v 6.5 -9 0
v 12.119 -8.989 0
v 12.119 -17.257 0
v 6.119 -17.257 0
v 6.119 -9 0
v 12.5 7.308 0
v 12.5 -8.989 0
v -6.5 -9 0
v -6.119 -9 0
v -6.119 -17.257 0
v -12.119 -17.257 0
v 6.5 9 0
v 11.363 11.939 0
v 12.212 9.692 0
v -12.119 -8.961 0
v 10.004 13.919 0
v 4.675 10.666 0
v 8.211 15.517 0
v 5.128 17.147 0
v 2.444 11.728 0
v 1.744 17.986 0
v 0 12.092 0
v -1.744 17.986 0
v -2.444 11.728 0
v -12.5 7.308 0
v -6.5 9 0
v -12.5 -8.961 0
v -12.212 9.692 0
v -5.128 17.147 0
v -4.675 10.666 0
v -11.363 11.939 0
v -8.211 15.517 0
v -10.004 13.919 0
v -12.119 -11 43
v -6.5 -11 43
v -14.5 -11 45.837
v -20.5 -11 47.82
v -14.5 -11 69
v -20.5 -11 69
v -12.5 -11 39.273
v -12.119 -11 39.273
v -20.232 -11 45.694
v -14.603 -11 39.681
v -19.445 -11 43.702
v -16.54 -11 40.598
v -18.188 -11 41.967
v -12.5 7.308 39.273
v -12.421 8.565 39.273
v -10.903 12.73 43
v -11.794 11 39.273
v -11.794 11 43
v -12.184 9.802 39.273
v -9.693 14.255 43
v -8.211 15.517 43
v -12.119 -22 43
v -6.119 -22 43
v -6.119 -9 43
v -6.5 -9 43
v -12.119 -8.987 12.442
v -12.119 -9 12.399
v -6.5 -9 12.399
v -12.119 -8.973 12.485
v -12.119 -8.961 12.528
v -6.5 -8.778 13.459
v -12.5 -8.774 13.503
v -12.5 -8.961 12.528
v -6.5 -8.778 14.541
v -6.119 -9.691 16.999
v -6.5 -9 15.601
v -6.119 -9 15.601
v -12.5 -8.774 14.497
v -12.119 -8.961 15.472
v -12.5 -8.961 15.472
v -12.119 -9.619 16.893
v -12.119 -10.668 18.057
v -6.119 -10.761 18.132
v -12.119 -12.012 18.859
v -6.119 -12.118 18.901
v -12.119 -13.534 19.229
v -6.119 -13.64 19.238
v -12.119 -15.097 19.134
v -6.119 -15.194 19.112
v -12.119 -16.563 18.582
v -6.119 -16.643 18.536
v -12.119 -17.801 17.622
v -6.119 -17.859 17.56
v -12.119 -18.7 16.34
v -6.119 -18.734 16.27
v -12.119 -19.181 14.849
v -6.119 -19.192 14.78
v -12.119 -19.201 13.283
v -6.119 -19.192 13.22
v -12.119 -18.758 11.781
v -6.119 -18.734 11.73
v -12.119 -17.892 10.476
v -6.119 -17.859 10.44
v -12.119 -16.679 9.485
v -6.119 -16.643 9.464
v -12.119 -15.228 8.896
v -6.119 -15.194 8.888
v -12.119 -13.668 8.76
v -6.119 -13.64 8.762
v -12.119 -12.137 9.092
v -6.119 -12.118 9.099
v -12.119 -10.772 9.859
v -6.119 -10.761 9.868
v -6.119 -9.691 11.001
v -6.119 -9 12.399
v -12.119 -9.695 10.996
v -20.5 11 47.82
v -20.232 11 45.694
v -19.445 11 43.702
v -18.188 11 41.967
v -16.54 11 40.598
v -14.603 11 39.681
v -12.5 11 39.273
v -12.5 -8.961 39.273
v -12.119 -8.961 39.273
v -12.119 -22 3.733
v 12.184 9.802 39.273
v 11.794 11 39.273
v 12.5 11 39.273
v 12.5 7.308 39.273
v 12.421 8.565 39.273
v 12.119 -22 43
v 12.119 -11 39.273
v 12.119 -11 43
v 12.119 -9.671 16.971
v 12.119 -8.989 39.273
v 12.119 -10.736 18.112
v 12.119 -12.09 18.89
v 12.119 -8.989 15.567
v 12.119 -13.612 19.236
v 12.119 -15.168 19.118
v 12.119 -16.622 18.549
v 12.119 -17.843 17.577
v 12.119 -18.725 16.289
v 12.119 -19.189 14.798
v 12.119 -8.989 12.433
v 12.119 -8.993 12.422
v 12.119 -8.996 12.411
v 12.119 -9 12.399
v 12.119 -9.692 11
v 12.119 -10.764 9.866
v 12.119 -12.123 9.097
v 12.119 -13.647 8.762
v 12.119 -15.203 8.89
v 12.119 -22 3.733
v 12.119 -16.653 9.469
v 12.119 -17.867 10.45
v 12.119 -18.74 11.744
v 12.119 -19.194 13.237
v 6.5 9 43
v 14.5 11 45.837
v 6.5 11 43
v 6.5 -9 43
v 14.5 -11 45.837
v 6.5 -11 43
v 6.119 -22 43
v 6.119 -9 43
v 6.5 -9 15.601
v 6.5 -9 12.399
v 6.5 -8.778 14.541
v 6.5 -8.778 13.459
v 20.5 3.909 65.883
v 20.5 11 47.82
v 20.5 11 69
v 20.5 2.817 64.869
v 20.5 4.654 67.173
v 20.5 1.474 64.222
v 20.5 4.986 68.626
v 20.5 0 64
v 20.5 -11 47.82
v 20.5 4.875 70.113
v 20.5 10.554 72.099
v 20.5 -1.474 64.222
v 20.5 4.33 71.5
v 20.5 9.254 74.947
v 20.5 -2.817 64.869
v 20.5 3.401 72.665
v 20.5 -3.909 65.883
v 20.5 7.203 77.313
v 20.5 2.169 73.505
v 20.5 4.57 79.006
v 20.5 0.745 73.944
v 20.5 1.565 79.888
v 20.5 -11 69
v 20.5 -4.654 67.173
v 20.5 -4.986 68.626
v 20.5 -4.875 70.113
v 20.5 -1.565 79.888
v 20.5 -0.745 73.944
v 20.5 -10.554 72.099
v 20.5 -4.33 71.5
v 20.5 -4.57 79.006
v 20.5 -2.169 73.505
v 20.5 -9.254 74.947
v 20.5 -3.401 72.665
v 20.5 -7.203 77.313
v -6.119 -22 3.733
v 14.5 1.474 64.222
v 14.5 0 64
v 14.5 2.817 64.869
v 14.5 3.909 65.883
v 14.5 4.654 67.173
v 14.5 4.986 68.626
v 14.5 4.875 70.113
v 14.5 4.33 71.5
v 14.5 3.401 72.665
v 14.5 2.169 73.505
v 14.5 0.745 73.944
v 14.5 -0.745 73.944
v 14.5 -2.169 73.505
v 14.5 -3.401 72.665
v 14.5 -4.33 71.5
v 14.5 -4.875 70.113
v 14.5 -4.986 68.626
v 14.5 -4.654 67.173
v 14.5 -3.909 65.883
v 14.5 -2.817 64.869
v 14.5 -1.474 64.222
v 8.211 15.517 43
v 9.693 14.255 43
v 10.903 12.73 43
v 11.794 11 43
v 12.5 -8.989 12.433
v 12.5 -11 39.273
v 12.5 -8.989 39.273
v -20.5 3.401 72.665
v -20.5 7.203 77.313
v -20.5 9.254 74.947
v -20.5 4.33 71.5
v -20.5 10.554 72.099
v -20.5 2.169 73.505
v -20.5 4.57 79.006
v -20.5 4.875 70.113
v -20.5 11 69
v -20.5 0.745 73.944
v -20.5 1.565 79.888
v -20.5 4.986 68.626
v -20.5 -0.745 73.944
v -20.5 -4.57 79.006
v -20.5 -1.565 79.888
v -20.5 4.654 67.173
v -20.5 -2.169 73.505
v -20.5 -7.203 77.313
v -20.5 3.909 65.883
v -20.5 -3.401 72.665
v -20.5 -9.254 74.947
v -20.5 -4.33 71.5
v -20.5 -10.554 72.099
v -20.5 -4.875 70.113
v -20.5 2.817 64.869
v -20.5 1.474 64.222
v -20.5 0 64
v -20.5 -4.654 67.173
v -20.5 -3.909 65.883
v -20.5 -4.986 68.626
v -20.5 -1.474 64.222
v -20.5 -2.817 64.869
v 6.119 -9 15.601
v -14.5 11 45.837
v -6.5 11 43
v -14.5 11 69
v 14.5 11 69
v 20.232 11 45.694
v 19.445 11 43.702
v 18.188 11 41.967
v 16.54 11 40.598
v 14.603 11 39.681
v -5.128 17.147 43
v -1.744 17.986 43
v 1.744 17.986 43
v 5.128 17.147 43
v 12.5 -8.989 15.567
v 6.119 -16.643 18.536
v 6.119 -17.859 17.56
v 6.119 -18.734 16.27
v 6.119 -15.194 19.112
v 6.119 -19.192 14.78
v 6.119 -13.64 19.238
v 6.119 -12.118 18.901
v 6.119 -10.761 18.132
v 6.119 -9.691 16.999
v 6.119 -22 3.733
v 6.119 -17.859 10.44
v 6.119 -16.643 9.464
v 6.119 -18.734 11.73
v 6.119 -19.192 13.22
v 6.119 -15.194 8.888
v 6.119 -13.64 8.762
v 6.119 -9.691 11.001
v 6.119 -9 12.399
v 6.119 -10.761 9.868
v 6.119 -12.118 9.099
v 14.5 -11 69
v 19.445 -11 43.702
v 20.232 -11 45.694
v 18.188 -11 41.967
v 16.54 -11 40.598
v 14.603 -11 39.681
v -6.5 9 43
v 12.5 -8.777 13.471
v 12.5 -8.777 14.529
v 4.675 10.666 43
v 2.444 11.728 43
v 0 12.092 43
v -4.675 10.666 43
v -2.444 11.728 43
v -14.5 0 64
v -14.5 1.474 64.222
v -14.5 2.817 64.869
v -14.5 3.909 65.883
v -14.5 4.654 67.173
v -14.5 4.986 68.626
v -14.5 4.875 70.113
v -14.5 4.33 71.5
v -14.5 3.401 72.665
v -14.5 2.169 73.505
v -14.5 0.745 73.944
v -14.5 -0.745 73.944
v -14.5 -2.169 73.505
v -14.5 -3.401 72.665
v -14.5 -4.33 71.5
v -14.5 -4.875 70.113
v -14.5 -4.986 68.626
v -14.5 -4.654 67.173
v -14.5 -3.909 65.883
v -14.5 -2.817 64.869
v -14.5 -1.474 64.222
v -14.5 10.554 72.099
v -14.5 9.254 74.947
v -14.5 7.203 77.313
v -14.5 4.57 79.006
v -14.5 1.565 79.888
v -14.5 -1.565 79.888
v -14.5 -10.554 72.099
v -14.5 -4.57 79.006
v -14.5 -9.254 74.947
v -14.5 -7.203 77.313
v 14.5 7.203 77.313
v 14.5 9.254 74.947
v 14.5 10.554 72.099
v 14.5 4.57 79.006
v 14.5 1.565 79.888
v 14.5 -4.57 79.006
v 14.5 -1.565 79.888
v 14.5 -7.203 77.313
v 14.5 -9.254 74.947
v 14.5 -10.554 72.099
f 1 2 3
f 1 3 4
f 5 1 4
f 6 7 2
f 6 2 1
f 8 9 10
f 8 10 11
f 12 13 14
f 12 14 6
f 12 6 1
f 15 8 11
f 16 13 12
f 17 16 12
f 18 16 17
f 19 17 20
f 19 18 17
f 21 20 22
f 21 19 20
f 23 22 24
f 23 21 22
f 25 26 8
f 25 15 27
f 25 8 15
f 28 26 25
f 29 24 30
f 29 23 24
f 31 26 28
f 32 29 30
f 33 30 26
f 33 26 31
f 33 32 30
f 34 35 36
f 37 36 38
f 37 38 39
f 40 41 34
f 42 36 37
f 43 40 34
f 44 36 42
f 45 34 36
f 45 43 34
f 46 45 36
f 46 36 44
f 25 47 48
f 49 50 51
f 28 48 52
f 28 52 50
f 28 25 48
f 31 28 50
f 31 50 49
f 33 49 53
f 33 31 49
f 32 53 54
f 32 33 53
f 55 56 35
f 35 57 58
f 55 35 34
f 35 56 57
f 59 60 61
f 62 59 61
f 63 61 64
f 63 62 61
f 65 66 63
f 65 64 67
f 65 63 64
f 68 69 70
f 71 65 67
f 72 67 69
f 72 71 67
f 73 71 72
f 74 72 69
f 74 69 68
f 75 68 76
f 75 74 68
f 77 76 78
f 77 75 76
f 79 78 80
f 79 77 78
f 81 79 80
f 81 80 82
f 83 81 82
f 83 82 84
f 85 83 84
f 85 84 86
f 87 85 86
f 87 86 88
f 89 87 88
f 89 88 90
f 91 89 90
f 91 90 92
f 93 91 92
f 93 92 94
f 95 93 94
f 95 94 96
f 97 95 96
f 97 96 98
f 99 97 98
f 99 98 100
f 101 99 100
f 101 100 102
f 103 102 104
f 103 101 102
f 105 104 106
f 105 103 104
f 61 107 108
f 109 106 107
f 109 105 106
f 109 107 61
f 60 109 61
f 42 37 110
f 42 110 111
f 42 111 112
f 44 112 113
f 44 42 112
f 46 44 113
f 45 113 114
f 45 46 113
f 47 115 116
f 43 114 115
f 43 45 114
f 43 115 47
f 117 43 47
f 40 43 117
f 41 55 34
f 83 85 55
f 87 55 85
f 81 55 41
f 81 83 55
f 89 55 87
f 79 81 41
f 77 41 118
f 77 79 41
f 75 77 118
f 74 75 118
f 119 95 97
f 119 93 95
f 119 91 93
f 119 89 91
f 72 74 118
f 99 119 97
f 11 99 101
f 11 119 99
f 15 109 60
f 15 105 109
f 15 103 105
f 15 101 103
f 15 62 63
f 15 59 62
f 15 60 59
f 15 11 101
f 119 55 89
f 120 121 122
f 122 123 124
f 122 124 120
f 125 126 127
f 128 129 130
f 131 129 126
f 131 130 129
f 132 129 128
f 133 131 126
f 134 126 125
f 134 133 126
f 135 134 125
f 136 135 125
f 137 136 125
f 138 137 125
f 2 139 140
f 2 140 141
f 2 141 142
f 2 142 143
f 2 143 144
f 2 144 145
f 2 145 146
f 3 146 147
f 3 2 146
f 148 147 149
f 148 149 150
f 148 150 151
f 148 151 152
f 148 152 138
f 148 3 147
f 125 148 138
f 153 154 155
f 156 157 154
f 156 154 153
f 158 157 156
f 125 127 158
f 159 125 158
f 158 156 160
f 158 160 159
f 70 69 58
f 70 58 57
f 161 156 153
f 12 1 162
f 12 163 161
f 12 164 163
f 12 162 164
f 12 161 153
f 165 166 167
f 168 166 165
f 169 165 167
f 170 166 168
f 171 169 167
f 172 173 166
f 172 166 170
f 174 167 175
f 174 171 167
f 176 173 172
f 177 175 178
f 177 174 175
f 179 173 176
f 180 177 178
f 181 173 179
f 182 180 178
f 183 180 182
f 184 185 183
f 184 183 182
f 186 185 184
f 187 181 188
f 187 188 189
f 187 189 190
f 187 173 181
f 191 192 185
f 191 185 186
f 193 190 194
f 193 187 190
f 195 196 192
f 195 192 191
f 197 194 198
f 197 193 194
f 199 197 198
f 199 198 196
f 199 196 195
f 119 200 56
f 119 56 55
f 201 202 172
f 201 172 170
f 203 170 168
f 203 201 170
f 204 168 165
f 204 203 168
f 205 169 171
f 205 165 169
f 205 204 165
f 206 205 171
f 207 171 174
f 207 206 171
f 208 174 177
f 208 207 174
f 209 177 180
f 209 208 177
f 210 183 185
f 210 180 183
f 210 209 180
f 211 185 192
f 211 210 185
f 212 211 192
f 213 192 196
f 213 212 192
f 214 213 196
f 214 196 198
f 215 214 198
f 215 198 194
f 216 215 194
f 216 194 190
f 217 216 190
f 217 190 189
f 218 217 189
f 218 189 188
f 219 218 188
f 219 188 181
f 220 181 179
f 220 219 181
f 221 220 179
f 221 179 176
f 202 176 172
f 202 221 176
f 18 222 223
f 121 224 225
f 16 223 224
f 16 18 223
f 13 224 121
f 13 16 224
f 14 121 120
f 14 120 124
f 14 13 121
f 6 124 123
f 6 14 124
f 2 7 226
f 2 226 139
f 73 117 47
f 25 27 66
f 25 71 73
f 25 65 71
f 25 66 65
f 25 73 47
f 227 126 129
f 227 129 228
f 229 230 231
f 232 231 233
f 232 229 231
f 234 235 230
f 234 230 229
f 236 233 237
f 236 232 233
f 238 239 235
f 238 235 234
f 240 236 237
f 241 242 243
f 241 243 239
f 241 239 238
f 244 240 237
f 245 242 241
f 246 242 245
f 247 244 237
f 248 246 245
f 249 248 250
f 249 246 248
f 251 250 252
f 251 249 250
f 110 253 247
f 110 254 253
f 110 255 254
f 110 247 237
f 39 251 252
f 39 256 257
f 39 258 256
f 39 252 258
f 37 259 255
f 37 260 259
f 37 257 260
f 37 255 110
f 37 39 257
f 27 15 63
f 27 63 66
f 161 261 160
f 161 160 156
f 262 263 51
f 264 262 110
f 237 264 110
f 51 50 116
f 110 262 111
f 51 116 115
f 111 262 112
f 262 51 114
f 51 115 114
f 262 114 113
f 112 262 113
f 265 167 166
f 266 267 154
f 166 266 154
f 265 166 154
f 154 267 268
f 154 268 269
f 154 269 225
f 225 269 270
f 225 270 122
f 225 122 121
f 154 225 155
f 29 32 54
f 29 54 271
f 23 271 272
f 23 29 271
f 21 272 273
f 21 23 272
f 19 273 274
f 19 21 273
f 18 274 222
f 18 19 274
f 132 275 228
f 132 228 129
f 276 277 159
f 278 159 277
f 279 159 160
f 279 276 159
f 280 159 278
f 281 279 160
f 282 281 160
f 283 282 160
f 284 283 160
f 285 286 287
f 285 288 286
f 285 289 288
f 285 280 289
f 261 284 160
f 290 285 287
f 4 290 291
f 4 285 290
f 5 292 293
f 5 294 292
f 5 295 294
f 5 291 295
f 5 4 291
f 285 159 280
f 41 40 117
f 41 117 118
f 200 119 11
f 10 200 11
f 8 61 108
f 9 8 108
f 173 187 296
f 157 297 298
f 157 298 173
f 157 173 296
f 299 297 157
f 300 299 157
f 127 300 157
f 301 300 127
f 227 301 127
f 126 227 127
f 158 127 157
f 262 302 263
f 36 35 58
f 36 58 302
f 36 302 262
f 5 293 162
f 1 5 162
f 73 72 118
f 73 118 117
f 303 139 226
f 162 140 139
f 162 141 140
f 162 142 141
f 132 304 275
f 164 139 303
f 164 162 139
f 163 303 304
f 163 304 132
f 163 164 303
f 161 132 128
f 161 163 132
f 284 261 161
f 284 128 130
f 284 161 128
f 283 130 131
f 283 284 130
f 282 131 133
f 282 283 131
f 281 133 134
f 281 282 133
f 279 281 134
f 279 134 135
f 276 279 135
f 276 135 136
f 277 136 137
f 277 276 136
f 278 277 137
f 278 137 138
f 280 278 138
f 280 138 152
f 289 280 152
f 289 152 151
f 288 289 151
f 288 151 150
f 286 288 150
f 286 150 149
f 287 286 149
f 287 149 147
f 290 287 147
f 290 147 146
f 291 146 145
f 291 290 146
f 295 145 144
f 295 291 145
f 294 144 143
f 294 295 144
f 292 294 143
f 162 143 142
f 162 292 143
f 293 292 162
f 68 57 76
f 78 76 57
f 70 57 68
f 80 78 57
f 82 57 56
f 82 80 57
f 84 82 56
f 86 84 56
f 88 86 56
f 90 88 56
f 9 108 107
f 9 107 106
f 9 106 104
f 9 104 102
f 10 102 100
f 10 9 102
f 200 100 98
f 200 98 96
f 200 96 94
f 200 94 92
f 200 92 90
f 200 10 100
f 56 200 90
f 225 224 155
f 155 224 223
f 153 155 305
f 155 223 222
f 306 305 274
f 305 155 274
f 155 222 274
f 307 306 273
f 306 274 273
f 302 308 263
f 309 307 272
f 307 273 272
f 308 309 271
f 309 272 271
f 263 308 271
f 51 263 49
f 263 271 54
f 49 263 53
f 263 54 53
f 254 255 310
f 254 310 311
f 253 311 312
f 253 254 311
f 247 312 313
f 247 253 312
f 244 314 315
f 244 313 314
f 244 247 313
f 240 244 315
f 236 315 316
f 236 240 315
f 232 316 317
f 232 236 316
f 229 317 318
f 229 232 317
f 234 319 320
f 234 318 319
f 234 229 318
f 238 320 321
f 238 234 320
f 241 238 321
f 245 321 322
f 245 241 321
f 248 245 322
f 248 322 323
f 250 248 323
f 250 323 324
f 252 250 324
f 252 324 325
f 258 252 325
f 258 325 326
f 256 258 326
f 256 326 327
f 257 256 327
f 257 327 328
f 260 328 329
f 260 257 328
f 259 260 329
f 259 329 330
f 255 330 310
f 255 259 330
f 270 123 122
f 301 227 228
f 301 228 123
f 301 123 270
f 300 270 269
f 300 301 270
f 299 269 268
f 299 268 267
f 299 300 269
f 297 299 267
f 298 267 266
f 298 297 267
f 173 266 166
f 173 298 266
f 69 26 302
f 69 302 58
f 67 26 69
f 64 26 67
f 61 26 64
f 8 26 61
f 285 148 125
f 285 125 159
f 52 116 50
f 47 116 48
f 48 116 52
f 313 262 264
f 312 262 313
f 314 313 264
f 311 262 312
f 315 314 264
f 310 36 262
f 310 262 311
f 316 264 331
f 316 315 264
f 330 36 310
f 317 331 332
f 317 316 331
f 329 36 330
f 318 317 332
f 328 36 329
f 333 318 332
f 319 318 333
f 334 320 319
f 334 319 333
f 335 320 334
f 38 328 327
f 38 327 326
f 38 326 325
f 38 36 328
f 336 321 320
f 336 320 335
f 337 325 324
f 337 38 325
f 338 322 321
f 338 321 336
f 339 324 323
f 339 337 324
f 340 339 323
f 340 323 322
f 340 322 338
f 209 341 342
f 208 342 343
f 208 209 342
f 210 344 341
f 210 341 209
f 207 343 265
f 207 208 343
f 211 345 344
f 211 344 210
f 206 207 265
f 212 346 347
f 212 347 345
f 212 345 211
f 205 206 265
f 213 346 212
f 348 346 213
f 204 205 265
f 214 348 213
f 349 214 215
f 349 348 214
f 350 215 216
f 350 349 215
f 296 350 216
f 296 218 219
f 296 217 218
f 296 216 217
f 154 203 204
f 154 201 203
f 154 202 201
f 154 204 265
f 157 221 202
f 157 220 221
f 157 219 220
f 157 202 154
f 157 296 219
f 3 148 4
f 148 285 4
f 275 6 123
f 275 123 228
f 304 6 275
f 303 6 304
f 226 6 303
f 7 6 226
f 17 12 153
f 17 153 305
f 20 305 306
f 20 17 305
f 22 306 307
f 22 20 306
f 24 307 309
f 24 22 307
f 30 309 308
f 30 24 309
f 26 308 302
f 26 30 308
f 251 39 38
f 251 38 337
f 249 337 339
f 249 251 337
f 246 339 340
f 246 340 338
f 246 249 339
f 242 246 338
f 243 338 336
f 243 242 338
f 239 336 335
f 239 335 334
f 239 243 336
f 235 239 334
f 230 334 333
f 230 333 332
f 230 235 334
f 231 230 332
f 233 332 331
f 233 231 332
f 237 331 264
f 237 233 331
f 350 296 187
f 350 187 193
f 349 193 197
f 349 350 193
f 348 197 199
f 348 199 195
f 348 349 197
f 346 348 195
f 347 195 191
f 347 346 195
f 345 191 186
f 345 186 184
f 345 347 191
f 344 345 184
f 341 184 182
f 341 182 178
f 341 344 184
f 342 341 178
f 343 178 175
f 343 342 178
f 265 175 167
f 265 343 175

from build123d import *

# Parameters (mm, degrees)
BOSS_EXTRUDE1_DEPTH      = 43
BOSS_EXTRUDE2_DEPTH      = 11
BOSS_EXTRUDE2_DEPTH_BACK = 11
CUT_EXTRUDE1_DEPTH       = 87.401678224
CUT_EXTRUDE1_DEPTH_BACK  = 87.401678224
SKETCH3_R                = 5.25
SKETCH3_R_2              = 5


with BuildPart() as part:
    # Sketch1 → Boss-Extrude1 (new body)
    with BuildSketch(Plane.XY):
        with BuildLine():
            Line((-6.5, 9), (-6.5, -9))
            Line((-6.5, -9), (-6.119061554, -9))
            Line((-6.119061554, -9), (-6.119061554, -22))
            Line((-6.119061554, -22), (-12.119061554, -22))
            Line((-12.119061554, -22), (-12.119061554, -8.960698063))
            Line((-12.119061554, -8.960698063), (-12.5, -8.960698063))
            Line((-12.5, -8.960698063), (-12.5, 7.308339657))
            ThreePointArc((-12.5, 7.308339657), (-11.36319561, 11.939080805), (-8.211247284, 15.51697258))
            ThreePointArc((-8.211247284, 15.51697258), (0, 18.0924797), (8.211247284, 15.51697258))
            ThreePointArc((8.211247284, 15.51697258), (11.36319561, 11.939080805), (12.5, 7.308339657))
            Line((12.5, 7.308339657), (12.5, -8.989240444))
            Line((12.5, -8.989240444), (12.119061554, -8.989240444))
            Line((12.119061554, -8.989240444), (12.119061554, -22))
            Line((12.119061554, -22), (6.119061554, -22))
            Line((6.119061554, -22), (6.119061554, -9))
            Line((6.119061554, -9), (6.5, -9))
            Line((6.5, -9), (6.5, 9))
            ThreePointArc((6.5, 9), (0, 12.0924797), (-6.5, 9))
        make_face()
    extrude(amount=BOSS_EXTRUDE1_DEPTH)

    # Sketch2 → Boss-Extrude2 (add, two sides: drawn at the far end of the back side and taken through both)
    with BuildSketch(Plane(origin=(0, 0, 0), x_dir=(1, 0, 0), z_dir=(0, 1, 0)).offset(-BOSS_EXTRUDE2_DEPTH_BACK)):
        with BuildLine():
            Line((-20.5, -81), (-20.5, -47.820060952))
            ThreePointArc((-20.5, -47.820060952), (-18.187988462, -41.966506434), (-12.5, -39.272757167))
            Line((-12.5, -39.272757167), (-6.5, -39.272757167))
            Line((-6.5, -39.272757167), (-6.5, -43))
            Line((-6.5, -43), (-14.5, -45.836759656))
            Line((-14.5, -45.836759656), (-14.5, -81))
            Line((-14.5, -81), (-20.5, -81))
        make_face()
        with BuildLine():
            Line((6.5, -39.272757167), (12.5, -39.272757167))
            ThreePointArc((12.5, -39.272757167), (18.187988462, -41.966506434), (20.5, -47.820060952))
            Line((20.5, -47.820060952), (20.5, -81))
            Line((20.5, -81), (14.5, -81))
            Line((14.5, -81), (14.5, -45.836759656))
            Line((14.5, -45.836759656), (6.5, -43))
            Line((6.5, -43), (6.5, -39.272757167))
        make_face()
    extrude(amount=BOSS_EXTRUDE2_DEPTH + BOSS_EXTRUDE2_DEPTH_BACK)

    # Sketch3 → Cut-Extrude1 (cut, two sides: drawn at the far end of the back side and taken through both)
    with BuildSketch(Plane(origin=(0, 0, 0), x_dir=(0, 0, -1), z_dir=(1, 0, 0)).offset(-CUT_EXTRUDE1_DEPTH_BACK)):
        with Locations(Location((-14, -14, 0), (0, 0, 72.247209838))):
            Circle(SKETCH3_R)
        with Locations((-69, 0)):
            Circle(SKETCH3_R_2)
        Polygon((-5.082033537, -23.71409096), (2.018266343, -14.692533465), (6.529045091, -36.912295444), align=None)
        with BuildLine():
            Line((-69, 11), (-69, 14.018852996))
            Line((-69, 14.018852996), (-85.29582804, 14.018852996))
            Line((-85.29582804, 14.018852996), (-85.29582804, -20.343414377))
            Line((-85.29582804, -20.343414377), (-69, -16.597000701))
            Line((-69, -16.597000701), (-69, -11))
            ThreePointArc((-69, -11), (-80, 0), (-69, 11))
        make_face()
    extrude(amount=CUT_EXTRUDE1_DEPTH + CUT_EXTRUDE1_DEPTH_BACK, mode=Mode.SUBTRACT)


solid = part.part
